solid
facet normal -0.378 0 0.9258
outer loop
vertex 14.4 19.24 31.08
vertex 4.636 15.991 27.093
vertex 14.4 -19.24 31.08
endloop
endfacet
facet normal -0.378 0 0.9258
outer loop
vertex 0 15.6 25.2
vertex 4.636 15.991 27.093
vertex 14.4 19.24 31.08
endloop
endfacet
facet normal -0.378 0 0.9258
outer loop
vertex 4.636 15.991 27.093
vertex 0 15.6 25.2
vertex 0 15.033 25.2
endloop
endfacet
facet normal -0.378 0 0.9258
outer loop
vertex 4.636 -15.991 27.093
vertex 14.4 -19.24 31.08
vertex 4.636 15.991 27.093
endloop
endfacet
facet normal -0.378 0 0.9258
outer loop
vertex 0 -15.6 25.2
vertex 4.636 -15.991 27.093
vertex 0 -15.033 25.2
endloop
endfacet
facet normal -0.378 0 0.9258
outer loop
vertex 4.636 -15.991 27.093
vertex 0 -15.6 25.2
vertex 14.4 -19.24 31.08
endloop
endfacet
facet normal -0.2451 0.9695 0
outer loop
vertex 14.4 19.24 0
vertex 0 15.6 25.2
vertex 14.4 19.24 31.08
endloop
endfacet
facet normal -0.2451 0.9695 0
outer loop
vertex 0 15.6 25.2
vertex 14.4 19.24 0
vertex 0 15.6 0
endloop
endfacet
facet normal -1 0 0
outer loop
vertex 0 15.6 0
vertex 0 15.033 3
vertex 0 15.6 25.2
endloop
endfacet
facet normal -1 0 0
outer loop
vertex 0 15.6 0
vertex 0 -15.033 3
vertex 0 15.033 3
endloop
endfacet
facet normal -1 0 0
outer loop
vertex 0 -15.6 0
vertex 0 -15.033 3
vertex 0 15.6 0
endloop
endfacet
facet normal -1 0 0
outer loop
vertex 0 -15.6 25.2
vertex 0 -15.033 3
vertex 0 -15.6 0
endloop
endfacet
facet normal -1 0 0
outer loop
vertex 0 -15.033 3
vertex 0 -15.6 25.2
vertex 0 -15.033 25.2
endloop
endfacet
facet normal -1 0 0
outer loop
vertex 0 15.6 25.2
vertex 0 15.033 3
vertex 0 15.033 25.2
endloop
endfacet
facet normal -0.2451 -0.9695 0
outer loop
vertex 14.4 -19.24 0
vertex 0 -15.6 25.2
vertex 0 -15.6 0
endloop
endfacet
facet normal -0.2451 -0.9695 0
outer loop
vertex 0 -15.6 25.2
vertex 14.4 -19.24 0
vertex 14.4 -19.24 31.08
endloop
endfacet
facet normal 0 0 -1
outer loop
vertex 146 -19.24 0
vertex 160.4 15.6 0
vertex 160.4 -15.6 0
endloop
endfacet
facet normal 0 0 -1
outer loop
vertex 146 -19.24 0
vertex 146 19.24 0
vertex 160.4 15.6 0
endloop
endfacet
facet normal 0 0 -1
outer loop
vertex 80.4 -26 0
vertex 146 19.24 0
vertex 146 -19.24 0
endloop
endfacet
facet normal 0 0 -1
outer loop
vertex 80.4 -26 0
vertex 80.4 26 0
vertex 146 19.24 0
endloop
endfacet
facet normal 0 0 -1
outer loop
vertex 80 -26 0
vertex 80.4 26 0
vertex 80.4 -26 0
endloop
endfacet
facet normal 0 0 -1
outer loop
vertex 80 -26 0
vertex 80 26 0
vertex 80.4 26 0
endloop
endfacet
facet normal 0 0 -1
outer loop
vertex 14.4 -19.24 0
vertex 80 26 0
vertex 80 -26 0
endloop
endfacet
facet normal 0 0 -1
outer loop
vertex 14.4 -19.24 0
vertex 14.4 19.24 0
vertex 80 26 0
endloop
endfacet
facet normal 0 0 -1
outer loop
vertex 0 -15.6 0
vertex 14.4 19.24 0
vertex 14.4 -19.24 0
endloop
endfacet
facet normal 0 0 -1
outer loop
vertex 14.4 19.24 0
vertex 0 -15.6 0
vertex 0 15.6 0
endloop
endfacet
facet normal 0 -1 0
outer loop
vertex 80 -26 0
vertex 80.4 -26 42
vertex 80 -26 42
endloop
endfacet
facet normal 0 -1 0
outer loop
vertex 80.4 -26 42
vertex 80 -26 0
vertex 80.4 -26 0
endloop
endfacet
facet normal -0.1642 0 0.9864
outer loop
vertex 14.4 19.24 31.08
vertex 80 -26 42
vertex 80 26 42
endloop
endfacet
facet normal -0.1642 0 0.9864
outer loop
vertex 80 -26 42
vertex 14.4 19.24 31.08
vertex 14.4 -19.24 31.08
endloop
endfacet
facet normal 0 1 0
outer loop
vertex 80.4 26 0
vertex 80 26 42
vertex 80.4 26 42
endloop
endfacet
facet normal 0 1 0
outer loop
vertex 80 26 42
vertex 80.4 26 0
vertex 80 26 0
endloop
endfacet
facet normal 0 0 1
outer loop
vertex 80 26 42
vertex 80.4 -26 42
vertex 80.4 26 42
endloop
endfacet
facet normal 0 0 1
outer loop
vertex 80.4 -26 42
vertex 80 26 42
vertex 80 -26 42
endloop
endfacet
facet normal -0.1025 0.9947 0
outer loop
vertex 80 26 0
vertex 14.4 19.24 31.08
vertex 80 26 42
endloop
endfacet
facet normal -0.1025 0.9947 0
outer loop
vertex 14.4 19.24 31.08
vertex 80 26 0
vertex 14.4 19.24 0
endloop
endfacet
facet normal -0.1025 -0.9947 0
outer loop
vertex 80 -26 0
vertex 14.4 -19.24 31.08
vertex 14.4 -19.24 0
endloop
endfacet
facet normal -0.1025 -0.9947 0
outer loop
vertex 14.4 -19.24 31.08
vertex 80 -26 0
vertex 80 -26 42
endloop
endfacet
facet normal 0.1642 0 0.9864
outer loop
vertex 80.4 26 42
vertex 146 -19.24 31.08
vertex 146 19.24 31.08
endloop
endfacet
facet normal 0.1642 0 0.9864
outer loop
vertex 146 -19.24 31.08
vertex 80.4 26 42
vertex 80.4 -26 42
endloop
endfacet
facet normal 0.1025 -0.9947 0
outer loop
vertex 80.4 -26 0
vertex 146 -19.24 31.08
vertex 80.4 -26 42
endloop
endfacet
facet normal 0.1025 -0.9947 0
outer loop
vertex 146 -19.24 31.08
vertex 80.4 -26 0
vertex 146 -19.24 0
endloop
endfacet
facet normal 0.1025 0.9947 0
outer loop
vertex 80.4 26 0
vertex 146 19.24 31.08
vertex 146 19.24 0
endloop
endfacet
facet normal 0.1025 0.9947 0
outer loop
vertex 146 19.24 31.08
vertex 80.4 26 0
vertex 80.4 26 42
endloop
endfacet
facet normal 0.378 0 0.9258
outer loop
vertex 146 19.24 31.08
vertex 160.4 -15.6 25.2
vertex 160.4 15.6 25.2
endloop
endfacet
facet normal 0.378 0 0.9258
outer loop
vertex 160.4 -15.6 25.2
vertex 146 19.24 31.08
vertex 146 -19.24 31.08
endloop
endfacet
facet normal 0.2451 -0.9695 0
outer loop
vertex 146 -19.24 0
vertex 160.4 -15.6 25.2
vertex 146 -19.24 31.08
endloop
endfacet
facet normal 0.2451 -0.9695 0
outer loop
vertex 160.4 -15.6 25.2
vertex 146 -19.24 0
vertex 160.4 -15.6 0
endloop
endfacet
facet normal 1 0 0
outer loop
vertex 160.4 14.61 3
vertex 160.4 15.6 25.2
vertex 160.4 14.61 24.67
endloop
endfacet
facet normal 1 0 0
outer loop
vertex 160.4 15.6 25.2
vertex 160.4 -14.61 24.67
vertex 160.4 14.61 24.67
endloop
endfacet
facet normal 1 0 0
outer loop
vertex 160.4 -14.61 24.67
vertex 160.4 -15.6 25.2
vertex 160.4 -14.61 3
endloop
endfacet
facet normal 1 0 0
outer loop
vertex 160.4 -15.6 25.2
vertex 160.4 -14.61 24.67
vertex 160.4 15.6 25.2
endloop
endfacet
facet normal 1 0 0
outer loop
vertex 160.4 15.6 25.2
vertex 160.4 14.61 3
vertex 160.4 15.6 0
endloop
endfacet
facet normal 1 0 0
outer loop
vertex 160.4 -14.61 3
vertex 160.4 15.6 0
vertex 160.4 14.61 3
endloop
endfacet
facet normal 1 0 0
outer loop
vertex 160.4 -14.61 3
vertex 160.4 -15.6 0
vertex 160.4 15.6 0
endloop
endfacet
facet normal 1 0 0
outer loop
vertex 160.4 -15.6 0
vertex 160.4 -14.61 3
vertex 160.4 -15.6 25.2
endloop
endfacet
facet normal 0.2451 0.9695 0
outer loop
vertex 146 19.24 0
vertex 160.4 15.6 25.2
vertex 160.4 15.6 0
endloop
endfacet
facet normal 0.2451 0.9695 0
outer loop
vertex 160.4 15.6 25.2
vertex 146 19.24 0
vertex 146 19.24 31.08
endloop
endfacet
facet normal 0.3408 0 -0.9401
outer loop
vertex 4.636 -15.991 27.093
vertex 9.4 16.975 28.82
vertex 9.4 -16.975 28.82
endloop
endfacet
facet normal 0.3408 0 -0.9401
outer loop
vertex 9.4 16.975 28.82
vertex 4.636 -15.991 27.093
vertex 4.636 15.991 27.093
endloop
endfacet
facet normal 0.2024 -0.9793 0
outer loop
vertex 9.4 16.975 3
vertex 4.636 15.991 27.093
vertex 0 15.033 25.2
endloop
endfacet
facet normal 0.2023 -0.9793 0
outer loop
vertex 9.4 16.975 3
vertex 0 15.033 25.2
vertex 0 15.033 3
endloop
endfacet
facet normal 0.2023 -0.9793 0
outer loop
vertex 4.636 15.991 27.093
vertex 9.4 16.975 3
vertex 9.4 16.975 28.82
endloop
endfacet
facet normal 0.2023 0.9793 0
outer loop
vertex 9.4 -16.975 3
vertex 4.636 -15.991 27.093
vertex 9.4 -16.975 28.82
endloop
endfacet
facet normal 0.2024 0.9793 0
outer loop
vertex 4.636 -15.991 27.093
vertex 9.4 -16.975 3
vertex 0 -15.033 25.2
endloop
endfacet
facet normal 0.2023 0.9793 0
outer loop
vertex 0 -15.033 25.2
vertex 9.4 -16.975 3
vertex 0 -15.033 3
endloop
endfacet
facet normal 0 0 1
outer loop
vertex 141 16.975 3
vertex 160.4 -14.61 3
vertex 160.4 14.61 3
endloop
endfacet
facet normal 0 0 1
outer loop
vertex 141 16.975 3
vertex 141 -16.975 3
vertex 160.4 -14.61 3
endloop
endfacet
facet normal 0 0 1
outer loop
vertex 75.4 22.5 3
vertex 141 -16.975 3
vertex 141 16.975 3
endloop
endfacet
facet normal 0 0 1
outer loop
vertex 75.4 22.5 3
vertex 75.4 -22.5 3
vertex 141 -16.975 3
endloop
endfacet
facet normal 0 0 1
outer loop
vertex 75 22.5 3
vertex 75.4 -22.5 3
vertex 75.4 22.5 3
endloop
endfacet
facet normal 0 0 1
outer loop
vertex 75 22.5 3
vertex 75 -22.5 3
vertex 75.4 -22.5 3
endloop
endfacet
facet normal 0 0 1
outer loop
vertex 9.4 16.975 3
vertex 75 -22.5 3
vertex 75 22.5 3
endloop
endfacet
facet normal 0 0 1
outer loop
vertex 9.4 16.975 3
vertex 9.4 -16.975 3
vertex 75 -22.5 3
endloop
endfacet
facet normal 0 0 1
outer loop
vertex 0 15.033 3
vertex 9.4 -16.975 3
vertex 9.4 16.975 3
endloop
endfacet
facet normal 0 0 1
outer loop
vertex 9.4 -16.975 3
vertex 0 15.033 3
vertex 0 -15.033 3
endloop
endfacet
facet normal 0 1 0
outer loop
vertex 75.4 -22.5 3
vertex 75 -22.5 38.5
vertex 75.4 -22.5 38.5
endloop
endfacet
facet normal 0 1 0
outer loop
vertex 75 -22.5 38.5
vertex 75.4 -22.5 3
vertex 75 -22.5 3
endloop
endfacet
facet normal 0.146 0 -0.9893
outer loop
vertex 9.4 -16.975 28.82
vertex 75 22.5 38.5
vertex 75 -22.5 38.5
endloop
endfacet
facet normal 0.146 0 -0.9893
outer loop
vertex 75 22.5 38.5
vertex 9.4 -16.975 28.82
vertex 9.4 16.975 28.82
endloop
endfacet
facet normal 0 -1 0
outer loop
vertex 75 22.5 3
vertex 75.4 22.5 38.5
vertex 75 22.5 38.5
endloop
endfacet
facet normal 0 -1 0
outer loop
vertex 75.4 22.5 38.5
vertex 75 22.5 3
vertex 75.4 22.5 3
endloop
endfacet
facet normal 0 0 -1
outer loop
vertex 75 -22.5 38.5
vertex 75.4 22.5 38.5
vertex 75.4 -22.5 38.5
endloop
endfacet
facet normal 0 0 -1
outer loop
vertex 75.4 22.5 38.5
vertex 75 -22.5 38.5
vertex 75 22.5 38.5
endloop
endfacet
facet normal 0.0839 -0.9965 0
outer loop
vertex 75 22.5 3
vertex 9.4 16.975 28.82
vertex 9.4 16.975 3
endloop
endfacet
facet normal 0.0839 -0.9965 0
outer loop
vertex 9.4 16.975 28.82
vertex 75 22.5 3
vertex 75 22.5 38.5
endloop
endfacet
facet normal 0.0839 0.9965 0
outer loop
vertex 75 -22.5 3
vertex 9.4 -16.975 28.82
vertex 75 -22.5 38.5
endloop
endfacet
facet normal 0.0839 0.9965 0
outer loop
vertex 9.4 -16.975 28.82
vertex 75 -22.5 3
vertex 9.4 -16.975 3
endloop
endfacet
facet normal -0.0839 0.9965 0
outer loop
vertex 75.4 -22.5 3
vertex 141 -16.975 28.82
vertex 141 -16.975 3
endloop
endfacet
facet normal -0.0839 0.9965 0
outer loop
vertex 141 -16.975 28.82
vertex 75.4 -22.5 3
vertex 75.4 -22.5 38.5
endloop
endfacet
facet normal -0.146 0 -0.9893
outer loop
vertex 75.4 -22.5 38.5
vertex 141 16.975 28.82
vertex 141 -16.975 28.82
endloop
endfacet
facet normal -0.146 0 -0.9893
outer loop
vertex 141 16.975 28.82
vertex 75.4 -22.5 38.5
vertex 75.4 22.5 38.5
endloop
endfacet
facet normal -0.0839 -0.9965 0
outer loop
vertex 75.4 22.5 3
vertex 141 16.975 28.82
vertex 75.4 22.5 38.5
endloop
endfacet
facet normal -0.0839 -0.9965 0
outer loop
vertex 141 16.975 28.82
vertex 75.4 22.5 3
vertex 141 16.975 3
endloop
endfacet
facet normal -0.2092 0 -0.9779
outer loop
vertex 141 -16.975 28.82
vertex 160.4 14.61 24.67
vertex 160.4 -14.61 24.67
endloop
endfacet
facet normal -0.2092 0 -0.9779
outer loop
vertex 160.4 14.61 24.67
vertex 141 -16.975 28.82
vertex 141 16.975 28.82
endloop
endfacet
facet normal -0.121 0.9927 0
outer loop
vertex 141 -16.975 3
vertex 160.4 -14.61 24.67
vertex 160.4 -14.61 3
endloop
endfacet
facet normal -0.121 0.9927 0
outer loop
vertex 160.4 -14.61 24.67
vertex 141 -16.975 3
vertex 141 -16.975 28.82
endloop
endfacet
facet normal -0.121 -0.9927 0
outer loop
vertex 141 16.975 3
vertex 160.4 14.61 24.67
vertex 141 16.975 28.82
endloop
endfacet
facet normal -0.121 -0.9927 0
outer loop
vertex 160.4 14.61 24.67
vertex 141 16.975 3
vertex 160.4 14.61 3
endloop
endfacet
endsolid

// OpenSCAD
$fn = 32;

// ----------------------------------------------------------------------
// Faired channel: 160 x 52 x 42 mm, 3.5 mm walls, faired ends
// ----------------------------------------------------------------------

// --- parameters (mm) ---
length = 160;             // channel length
width = 52;               // channel width at mid length
height = 42;              // channel height at mid length
wall = 3.5;               // side wall thickness
floor_t = 3;              // floor thickness
end_w = 31.2;             // faired end width
end_h = 25.2;             // faired end height

difference() {
  union() {
    hull() {
      translate([0, -15.6, 0]) cube([0.4, 31.2, 25.2]);
      translate([14.4, -19.24, 0]) cube([0.4, 38.48, 31.08]);
    }
    hull() {
      translate([14.4, -19.24, 0]) cube([0.4, 38.48, 31.08]);
      translate([80, -26, 0]) cube([0.4, 52, 42]);
    }
    hull() {
      translate([80, -26, 0]) cube([0.4, 52, 42]);
      translate([145.6, -19.24, 0]) cube([0.4, 38.48, 31.08]);
    }
    hull() {
      translate([145.6, -19.24, 0]) cube([0.4, 38.48, 31.08]);
      translate([160, -15.6, 0]) cube([0.4, 31.2, 25.2]);
    }
  }
  /* cavity, 5 mm proud of both ends so the ports are cut clean */
  hull() {
    translate([-5, -14, 3]) cube([0.4, 28, 20.6]);
    translate([9.4, -16.975, 3]) cube([0.4, 33.95, 25.82]);
  }
  hull() {
    translate([9.4, -16.975, 3]) cube([0.4, 33.95, 25.82]);
    translate([75, -22.5, 3]) cube([0.4, 45, 35.5]);
  }
  hull() {
    translate([75, -22.5, 3]) cube([0.4, 45, 35.5]);
    translate([140.6, -16.975, 3]) cube([0.4, 33.95, 25.82]);
  }
  hull() {
    translate([140.6, -16.975, 3]) cube([0.4, 33.95, 25.82]);
    translate([165, -14, 3]) cube([0.4, 28, 20.6]);
  }
}
